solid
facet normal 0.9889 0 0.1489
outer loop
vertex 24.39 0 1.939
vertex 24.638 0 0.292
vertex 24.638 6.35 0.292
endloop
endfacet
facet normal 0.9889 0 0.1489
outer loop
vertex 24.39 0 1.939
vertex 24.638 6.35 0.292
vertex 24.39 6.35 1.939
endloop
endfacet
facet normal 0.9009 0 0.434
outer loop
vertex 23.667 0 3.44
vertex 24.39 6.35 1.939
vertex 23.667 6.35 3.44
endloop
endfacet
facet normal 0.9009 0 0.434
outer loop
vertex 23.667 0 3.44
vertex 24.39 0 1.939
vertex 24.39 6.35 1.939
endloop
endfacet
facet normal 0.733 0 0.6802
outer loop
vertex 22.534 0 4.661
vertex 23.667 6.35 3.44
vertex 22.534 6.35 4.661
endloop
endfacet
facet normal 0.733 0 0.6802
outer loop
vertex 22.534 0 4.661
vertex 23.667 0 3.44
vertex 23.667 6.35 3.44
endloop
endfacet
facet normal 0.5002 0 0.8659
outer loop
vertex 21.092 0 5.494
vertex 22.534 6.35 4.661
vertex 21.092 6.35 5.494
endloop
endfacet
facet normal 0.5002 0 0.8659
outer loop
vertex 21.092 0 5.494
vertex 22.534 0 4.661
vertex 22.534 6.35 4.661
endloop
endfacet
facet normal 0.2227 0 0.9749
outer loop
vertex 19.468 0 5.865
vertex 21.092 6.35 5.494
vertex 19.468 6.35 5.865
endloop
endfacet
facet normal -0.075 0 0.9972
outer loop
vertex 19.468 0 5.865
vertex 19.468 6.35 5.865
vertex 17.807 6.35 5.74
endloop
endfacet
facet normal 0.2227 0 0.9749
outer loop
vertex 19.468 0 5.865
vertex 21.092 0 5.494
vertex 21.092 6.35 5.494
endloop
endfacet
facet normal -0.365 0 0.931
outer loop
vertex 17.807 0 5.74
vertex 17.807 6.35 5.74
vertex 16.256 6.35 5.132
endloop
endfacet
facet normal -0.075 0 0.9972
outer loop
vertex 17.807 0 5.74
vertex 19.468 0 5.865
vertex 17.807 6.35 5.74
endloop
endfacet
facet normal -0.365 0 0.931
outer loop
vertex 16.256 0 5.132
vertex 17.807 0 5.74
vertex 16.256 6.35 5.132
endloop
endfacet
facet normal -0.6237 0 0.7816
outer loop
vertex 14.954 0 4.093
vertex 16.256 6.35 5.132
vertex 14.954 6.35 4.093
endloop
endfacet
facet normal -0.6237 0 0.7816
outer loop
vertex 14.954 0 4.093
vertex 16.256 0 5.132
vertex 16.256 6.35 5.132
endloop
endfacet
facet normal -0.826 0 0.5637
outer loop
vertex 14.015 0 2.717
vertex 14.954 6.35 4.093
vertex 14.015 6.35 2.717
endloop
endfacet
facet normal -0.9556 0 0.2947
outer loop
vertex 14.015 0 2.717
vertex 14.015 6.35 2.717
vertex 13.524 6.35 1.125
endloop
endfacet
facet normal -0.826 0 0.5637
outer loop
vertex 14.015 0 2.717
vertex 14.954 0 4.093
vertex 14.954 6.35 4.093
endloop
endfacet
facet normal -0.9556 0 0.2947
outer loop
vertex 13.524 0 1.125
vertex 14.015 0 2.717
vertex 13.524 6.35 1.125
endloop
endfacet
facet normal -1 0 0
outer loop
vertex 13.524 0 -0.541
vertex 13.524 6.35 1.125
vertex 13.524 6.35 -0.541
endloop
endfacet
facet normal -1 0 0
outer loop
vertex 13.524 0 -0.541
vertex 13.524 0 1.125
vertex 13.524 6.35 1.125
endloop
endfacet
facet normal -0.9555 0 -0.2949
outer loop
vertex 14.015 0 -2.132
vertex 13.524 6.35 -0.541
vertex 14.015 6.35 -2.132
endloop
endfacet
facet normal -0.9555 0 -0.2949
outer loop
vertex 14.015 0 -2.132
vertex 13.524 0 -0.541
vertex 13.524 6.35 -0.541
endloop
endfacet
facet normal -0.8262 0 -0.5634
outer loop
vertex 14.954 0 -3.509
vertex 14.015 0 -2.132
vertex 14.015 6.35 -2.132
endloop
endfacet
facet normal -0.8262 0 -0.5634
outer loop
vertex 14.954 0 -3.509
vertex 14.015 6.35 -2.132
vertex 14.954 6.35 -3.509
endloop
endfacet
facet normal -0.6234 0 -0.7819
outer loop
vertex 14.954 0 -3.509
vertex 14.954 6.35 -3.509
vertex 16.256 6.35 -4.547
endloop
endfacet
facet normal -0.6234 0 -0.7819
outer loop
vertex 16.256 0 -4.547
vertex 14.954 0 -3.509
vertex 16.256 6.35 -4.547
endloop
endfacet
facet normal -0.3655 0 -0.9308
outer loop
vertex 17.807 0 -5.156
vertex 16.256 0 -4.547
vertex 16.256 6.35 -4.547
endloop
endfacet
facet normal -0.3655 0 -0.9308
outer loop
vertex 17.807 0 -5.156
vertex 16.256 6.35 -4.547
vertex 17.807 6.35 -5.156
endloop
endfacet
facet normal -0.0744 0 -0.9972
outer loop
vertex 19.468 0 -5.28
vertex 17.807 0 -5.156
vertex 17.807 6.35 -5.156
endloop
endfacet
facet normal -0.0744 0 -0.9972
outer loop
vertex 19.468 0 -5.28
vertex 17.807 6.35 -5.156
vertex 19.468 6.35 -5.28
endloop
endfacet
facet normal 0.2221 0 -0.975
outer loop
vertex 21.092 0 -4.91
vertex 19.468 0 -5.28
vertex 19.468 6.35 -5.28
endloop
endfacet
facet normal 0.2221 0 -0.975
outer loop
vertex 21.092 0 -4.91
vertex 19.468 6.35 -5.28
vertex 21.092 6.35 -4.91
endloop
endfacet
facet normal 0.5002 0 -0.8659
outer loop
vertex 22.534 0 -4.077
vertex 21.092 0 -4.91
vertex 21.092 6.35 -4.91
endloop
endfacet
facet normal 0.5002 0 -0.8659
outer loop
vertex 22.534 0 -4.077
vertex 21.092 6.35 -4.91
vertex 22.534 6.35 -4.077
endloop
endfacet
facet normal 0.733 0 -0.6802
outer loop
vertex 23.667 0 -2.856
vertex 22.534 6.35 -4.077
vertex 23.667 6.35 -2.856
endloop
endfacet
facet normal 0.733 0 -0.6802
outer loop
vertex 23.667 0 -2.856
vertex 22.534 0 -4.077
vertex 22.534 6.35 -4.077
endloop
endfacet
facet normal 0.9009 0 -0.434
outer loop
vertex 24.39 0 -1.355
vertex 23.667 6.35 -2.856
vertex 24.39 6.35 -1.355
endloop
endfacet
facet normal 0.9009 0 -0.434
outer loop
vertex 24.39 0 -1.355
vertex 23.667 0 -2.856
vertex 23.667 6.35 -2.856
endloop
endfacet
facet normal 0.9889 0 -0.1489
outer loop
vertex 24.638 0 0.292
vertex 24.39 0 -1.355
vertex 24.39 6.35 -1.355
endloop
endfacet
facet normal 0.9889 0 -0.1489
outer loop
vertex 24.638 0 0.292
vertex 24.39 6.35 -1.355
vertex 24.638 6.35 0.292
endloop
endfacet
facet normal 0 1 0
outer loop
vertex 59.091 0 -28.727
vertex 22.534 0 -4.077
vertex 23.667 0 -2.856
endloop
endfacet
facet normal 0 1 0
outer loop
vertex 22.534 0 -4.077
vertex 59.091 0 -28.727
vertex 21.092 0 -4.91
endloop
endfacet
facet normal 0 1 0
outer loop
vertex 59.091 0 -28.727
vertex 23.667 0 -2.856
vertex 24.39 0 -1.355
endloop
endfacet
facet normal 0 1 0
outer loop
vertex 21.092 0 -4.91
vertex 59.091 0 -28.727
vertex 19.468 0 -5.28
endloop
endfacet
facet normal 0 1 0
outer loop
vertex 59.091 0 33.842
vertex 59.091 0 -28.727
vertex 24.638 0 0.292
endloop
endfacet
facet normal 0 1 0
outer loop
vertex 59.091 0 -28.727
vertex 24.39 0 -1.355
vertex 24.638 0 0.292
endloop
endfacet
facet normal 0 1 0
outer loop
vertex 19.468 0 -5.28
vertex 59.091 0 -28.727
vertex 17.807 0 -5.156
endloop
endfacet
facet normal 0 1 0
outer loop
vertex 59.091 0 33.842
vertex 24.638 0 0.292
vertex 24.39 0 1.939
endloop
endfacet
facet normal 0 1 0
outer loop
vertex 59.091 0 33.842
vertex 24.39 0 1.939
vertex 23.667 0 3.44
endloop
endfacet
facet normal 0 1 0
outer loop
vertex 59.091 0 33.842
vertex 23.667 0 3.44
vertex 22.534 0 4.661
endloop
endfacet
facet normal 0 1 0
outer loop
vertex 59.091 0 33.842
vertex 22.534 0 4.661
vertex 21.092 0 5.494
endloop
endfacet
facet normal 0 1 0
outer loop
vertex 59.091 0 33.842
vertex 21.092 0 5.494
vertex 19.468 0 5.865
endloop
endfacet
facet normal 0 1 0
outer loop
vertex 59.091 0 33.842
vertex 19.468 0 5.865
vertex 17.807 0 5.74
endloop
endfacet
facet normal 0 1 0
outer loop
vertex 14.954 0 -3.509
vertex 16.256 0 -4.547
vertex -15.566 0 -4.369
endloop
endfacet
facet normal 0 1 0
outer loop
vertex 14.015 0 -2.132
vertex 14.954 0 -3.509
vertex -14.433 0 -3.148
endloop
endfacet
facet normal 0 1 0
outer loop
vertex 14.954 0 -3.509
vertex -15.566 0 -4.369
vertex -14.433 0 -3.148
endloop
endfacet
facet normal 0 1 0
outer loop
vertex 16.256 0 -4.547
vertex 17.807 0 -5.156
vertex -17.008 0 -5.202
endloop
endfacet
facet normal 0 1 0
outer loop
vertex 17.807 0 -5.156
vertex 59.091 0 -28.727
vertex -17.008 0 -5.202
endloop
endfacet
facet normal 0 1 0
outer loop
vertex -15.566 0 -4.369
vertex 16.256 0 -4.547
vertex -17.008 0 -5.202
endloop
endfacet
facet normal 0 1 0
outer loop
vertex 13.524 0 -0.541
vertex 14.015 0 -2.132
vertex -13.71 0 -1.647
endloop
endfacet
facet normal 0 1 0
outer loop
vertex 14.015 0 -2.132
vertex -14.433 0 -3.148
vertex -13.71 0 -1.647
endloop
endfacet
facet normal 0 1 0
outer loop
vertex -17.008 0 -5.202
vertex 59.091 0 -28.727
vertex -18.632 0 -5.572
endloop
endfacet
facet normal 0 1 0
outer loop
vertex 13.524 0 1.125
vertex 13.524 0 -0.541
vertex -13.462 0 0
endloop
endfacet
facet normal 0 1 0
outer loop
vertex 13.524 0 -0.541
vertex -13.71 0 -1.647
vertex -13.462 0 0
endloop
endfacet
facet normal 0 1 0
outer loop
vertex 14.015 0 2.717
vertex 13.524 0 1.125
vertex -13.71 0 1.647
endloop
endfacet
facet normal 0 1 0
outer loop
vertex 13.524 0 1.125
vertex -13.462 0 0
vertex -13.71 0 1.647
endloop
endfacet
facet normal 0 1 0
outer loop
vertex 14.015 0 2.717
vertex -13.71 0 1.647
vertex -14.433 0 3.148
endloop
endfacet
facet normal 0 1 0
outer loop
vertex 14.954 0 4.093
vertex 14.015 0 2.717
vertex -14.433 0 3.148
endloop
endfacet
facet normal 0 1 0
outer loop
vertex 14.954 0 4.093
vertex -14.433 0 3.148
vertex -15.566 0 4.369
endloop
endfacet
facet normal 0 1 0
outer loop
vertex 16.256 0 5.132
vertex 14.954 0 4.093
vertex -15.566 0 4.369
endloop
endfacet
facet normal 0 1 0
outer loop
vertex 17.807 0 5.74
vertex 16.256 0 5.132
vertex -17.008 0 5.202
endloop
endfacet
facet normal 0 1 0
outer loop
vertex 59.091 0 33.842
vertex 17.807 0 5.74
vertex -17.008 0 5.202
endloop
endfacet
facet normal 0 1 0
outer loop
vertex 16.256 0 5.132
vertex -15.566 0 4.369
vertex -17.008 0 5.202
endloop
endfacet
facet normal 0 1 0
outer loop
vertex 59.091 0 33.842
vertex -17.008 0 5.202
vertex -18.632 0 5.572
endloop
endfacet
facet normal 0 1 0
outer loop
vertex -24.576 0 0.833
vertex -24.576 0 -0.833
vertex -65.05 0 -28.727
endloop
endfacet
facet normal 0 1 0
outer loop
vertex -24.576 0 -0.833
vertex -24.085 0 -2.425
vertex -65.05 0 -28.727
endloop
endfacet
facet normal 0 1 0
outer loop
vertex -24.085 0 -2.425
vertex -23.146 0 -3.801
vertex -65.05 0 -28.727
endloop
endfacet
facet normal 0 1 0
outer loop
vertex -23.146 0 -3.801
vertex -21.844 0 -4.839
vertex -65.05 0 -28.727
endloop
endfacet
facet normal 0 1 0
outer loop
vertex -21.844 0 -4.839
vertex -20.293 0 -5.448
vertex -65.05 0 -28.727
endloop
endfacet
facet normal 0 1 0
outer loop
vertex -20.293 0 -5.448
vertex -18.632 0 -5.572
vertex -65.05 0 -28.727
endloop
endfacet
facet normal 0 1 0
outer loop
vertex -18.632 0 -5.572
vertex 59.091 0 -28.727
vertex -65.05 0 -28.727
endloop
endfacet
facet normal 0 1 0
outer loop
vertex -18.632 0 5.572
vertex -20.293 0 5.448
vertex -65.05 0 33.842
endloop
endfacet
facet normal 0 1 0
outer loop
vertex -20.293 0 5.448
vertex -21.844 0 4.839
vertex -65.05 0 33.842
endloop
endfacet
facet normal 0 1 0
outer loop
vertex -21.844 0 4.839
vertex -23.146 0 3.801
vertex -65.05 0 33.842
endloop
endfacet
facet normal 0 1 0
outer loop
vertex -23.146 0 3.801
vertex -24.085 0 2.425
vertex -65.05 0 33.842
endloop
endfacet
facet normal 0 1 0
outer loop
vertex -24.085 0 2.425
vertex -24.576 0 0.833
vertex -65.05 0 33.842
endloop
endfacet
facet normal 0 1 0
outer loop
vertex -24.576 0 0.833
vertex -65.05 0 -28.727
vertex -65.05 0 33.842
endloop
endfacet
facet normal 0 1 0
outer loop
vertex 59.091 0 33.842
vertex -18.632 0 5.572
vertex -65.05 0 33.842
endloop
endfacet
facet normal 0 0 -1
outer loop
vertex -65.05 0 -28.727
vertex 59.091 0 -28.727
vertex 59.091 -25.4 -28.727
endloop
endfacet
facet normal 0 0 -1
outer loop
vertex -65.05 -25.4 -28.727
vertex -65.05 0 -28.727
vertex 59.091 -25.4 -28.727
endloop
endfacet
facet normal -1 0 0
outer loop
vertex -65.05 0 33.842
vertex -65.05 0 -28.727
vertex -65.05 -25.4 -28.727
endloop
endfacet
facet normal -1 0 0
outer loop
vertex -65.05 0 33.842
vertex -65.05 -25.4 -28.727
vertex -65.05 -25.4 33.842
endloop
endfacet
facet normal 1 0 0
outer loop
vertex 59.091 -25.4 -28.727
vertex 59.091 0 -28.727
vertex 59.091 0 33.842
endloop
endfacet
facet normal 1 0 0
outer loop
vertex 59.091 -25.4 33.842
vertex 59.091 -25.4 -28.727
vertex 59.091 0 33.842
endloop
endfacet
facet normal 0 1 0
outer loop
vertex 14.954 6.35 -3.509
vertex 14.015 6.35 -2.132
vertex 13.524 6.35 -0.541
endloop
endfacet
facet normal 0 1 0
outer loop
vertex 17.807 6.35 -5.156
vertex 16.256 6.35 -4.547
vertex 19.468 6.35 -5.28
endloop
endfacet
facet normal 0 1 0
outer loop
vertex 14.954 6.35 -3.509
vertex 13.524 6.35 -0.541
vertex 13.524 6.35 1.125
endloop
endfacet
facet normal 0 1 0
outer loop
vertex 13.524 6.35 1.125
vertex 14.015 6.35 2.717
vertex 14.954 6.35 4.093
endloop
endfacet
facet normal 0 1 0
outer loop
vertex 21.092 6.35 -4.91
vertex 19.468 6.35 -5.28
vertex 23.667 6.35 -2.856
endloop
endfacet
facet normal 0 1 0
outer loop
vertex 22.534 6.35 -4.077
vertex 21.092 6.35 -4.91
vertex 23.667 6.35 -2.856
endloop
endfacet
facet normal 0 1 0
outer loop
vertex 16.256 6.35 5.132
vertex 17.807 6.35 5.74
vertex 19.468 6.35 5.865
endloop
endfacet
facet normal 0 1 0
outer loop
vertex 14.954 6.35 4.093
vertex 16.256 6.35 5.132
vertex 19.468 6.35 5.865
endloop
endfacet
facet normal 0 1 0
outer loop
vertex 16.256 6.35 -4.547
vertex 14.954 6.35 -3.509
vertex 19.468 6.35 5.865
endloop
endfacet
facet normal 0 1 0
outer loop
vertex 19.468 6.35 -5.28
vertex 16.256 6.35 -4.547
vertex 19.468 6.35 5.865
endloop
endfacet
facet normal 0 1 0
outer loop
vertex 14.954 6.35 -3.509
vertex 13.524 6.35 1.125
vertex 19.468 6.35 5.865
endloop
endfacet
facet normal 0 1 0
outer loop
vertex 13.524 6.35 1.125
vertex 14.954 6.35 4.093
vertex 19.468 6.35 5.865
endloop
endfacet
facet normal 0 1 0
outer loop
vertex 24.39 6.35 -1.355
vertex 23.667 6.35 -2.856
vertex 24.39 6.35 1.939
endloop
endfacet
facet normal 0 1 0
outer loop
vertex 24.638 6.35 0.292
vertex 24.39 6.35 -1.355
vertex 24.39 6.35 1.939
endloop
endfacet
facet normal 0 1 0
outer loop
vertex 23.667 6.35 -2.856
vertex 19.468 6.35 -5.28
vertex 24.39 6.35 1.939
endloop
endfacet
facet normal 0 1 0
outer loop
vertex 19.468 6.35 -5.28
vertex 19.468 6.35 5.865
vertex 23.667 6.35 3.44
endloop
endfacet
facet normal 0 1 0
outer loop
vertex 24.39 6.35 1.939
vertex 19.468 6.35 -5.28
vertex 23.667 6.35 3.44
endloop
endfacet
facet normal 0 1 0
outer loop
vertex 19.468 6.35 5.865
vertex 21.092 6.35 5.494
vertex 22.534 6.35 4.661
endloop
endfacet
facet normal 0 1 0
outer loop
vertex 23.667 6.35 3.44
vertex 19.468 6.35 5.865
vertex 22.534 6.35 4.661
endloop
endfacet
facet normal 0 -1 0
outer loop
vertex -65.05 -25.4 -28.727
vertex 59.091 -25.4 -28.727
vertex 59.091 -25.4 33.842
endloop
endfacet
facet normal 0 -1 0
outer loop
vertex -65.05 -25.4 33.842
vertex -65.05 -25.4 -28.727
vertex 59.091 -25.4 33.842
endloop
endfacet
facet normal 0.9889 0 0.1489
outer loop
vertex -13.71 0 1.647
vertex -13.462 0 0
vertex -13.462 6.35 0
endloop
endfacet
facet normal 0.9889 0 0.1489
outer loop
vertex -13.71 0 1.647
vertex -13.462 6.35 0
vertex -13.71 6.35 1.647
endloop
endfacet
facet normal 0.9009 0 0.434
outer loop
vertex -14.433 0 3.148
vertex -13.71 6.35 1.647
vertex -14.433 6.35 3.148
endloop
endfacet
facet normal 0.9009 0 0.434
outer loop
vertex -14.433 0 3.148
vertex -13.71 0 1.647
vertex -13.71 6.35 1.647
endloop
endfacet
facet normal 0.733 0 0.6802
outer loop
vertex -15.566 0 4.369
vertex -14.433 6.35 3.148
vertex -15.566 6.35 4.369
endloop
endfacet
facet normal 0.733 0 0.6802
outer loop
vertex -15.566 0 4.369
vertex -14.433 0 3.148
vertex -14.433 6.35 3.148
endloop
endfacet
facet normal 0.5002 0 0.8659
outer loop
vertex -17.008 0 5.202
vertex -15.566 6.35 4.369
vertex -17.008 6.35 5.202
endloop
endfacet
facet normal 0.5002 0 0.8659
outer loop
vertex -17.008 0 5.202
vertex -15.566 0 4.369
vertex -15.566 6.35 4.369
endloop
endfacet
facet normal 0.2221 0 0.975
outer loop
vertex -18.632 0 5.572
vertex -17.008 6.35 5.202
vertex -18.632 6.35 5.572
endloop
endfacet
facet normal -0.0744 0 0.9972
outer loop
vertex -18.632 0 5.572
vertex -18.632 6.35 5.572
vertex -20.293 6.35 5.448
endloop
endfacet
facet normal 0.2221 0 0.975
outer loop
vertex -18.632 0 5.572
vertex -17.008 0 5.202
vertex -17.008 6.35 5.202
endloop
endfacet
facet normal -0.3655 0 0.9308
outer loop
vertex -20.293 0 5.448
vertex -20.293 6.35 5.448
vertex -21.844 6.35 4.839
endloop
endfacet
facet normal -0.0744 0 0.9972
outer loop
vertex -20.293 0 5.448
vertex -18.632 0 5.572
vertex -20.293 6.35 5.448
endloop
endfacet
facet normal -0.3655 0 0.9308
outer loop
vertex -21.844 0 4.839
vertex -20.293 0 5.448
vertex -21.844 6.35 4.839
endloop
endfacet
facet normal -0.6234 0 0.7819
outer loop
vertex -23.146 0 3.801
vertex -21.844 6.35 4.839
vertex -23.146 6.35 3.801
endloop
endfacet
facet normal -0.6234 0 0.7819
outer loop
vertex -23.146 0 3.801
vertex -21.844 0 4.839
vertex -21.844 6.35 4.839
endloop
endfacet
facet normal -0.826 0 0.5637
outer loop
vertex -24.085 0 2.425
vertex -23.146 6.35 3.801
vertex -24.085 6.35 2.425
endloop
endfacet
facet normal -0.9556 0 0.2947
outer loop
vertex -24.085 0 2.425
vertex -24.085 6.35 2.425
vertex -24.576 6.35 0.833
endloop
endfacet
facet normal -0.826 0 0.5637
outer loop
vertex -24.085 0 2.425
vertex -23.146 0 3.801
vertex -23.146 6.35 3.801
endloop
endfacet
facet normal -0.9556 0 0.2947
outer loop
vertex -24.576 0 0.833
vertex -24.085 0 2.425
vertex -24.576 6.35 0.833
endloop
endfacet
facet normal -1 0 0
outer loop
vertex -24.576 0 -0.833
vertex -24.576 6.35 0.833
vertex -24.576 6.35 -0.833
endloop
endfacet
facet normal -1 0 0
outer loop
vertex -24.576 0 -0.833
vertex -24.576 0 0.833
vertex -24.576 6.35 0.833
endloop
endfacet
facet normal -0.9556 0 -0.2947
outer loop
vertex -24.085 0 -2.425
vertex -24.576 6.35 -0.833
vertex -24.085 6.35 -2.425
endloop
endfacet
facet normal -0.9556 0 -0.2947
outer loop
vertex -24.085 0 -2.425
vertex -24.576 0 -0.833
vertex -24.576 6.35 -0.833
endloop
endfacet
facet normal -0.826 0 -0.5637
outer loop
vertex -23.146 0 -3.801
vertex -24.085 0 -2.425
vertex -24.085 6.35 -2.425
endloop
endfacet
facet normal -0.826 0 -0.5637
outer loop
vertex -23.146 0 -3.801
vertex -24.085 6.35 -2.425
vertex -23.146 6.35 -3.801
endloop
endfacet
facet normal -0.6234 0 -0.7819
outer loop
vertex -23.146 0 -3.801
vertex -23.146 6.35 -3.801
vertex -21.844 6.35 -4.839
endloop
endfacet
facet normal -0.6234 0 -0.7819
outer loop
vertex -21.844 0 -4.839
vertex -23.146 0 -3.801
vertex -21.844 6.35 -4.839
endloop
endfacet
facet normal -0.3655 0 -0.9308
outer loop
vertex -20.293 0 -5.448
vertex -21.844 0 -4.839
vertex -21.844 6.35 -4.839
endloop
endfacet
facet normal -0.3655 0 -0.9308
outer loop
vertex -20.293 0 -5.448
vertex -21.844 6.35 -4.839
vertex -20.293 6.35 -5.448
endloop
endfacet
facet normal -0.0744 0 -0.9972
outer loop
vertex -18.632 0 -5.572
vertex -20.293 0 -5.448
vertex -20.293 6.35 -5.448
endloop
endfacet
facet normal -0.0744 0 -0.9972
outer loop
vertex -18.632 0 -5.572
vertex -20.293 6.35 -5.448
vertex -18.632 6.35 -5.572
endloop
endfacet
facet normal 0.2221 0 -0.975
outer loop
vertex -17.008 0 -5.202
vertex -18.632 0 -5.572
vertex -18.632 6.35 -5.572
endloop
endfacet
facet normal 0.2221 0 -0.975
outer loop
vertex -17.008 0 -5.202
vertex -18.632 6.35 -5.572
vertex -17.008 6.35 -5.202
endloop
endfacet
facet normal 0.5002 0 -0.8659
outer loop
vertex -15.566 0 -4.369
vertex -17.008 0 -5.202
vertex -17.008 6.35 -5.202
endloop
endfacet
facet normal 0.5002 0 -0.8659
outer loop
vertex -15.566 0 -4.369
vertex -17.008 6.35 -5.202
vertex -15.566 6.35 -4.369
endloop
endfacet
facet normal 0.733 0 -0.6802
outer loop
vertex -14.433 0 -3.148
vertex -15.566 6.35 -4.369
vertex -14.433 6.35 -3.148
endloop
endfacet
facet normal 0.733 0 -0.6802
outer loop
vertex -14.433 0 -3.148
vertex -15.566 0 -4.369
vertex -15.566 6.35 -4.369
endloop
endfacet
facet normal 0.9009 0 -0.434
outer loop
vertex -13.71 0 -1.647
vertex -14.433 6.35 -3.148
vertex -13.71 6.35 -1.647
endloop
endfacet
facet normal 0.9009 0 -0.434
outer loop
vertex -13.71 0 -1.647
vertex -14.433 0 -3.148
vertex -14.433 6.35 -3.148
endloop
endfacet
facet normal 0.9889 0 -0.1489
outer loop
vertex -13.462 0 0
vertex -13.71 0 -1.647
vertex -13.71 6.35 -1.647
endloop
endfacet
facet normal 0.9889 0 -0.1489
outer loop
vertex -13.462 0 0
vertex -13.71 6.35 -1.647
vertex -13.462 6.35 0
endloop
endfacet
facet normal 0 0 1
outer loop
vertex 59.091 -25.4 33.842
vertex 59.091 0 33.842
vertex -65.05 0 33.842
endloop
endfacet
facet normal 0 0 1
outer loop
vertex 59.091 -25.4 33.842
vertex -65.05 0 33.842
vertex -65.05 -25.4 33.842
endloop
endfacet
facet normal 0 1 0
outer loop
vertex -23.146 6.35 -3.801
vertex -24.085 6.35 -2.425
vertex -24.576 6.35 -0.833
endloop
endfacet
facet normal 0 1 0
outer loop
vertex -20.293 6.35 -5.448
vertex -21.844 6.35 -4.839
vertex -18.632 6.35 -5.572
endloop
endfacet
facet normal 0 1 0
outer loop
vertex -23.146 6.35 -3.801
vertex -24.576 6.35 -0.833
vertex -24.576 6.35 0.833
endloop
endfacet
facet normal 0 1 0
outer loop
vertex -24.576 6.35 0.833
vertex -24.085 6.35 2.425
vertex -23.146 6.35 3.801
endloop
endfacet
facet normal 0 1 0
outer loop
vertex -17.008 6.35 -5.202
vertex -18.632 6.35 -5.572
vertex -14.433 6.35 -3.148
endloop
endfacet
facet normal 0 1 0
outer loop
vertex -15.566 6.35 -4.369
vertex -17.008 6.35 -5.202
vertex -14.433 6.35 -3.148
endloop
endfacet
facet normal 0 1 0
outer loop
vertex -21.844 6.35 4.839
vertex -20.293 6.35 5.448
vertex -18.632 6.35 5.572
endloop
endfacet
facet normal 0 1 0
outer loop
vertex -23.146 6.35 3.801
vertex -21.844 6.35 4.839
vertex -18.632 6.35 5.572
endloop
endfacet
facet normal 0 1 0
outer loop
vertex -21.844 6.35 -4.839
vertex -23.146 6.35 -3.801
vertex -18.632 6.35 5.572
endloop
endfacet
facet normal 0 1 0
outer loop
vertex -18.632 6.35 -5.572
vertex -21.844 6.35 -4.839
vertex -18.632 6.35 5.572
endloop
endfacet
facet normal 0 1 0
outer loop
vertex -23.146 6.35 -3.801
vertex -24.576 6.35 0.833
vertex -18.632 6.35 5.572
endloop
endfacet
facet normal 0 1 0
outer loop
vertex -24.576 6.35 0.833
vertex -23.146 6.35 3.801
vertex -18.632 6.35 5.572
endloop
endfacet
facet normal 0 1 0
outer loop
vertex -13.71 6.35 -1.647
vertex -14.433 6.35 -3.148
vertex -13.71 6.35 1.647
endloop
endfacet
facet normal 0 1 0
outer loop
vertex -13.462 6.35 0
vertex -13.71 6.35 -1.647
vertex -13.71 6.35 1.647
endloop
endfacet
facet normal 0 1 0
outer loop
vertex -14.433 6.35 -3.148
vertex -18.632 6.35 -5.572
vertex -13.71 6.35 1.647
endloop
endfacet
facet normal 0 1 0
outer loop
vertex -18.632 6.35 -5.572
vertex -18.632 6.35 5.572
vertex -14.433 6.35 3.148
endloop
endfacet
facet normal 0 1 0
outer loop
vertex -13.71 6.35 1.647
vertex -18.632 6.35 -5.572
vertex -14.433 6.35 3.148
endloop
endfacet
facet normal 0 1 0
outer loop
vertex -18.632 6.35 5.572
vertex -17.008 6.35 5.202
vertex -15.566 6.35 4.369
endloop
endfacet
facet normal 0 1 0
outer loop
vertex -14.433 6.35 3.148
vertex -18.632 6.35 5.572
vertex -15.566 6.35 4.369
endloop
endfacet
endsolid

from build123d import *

# Parameters (mm, degrees)
F0_W     = 88.6754395919
F0_H     = 62.5690418352
F0_R     = 5.588
F1_DEPTH = 25.4
F2_DEPTH = 6.35
F3_DEPTH = 25.4
F4_DEPTH = 10.06593


with BuildPart() as f1:
    # F0 (on Front) → F1 (new body)
    with BuildSketch(Plane.XZ):
        with Locations((4.6873632818, 2.5576064363)):
            Rectangle(F0_W, F0_H)
        with Locations((-19.05, 0)):
            Circle(F0_R, mode=Mode.SUBTRACT)
        with Locations((19.05, 0.2921762194)):
            Circle(F0_R, mode=Mode.SUBTRACT)
        with Locations((-19.05, 0)):
            Circle(F0_R)
        with Locations((19.05, 0.2921762194)):
            Circle(F0_R)
    extrude(amount=F1_DEPTH)

    # F0 (on Front) → F2 (join)
    with BuildSketch(Plane.XZ):
        with Locations((19.05, 0.2921762194)):
            Circle(F0_R)
        with Locations((-19.05, 0)):
            Circle(F0_R)
    extrude(amount=-F2_DEPTH)

    # F3 (add): a face of the model
    f3_faces = [f1.faces().sort_by_distance(p)[0] for p in [
        (-39.6503565141, -12.7, 2.5576064363),
    ]]
    extrude(f3_faces, amount=F3_DEPTH)

    # F4 (add): a face of the model
    f4_faces = [f1.faces().sort_by_distance(p)[0] for p in [
        (49.0250830778, -12.7, 2.5576064363),
    ]]
    extrude(f4_faces, amount=F4_DEPTH)


solid = f1.part
